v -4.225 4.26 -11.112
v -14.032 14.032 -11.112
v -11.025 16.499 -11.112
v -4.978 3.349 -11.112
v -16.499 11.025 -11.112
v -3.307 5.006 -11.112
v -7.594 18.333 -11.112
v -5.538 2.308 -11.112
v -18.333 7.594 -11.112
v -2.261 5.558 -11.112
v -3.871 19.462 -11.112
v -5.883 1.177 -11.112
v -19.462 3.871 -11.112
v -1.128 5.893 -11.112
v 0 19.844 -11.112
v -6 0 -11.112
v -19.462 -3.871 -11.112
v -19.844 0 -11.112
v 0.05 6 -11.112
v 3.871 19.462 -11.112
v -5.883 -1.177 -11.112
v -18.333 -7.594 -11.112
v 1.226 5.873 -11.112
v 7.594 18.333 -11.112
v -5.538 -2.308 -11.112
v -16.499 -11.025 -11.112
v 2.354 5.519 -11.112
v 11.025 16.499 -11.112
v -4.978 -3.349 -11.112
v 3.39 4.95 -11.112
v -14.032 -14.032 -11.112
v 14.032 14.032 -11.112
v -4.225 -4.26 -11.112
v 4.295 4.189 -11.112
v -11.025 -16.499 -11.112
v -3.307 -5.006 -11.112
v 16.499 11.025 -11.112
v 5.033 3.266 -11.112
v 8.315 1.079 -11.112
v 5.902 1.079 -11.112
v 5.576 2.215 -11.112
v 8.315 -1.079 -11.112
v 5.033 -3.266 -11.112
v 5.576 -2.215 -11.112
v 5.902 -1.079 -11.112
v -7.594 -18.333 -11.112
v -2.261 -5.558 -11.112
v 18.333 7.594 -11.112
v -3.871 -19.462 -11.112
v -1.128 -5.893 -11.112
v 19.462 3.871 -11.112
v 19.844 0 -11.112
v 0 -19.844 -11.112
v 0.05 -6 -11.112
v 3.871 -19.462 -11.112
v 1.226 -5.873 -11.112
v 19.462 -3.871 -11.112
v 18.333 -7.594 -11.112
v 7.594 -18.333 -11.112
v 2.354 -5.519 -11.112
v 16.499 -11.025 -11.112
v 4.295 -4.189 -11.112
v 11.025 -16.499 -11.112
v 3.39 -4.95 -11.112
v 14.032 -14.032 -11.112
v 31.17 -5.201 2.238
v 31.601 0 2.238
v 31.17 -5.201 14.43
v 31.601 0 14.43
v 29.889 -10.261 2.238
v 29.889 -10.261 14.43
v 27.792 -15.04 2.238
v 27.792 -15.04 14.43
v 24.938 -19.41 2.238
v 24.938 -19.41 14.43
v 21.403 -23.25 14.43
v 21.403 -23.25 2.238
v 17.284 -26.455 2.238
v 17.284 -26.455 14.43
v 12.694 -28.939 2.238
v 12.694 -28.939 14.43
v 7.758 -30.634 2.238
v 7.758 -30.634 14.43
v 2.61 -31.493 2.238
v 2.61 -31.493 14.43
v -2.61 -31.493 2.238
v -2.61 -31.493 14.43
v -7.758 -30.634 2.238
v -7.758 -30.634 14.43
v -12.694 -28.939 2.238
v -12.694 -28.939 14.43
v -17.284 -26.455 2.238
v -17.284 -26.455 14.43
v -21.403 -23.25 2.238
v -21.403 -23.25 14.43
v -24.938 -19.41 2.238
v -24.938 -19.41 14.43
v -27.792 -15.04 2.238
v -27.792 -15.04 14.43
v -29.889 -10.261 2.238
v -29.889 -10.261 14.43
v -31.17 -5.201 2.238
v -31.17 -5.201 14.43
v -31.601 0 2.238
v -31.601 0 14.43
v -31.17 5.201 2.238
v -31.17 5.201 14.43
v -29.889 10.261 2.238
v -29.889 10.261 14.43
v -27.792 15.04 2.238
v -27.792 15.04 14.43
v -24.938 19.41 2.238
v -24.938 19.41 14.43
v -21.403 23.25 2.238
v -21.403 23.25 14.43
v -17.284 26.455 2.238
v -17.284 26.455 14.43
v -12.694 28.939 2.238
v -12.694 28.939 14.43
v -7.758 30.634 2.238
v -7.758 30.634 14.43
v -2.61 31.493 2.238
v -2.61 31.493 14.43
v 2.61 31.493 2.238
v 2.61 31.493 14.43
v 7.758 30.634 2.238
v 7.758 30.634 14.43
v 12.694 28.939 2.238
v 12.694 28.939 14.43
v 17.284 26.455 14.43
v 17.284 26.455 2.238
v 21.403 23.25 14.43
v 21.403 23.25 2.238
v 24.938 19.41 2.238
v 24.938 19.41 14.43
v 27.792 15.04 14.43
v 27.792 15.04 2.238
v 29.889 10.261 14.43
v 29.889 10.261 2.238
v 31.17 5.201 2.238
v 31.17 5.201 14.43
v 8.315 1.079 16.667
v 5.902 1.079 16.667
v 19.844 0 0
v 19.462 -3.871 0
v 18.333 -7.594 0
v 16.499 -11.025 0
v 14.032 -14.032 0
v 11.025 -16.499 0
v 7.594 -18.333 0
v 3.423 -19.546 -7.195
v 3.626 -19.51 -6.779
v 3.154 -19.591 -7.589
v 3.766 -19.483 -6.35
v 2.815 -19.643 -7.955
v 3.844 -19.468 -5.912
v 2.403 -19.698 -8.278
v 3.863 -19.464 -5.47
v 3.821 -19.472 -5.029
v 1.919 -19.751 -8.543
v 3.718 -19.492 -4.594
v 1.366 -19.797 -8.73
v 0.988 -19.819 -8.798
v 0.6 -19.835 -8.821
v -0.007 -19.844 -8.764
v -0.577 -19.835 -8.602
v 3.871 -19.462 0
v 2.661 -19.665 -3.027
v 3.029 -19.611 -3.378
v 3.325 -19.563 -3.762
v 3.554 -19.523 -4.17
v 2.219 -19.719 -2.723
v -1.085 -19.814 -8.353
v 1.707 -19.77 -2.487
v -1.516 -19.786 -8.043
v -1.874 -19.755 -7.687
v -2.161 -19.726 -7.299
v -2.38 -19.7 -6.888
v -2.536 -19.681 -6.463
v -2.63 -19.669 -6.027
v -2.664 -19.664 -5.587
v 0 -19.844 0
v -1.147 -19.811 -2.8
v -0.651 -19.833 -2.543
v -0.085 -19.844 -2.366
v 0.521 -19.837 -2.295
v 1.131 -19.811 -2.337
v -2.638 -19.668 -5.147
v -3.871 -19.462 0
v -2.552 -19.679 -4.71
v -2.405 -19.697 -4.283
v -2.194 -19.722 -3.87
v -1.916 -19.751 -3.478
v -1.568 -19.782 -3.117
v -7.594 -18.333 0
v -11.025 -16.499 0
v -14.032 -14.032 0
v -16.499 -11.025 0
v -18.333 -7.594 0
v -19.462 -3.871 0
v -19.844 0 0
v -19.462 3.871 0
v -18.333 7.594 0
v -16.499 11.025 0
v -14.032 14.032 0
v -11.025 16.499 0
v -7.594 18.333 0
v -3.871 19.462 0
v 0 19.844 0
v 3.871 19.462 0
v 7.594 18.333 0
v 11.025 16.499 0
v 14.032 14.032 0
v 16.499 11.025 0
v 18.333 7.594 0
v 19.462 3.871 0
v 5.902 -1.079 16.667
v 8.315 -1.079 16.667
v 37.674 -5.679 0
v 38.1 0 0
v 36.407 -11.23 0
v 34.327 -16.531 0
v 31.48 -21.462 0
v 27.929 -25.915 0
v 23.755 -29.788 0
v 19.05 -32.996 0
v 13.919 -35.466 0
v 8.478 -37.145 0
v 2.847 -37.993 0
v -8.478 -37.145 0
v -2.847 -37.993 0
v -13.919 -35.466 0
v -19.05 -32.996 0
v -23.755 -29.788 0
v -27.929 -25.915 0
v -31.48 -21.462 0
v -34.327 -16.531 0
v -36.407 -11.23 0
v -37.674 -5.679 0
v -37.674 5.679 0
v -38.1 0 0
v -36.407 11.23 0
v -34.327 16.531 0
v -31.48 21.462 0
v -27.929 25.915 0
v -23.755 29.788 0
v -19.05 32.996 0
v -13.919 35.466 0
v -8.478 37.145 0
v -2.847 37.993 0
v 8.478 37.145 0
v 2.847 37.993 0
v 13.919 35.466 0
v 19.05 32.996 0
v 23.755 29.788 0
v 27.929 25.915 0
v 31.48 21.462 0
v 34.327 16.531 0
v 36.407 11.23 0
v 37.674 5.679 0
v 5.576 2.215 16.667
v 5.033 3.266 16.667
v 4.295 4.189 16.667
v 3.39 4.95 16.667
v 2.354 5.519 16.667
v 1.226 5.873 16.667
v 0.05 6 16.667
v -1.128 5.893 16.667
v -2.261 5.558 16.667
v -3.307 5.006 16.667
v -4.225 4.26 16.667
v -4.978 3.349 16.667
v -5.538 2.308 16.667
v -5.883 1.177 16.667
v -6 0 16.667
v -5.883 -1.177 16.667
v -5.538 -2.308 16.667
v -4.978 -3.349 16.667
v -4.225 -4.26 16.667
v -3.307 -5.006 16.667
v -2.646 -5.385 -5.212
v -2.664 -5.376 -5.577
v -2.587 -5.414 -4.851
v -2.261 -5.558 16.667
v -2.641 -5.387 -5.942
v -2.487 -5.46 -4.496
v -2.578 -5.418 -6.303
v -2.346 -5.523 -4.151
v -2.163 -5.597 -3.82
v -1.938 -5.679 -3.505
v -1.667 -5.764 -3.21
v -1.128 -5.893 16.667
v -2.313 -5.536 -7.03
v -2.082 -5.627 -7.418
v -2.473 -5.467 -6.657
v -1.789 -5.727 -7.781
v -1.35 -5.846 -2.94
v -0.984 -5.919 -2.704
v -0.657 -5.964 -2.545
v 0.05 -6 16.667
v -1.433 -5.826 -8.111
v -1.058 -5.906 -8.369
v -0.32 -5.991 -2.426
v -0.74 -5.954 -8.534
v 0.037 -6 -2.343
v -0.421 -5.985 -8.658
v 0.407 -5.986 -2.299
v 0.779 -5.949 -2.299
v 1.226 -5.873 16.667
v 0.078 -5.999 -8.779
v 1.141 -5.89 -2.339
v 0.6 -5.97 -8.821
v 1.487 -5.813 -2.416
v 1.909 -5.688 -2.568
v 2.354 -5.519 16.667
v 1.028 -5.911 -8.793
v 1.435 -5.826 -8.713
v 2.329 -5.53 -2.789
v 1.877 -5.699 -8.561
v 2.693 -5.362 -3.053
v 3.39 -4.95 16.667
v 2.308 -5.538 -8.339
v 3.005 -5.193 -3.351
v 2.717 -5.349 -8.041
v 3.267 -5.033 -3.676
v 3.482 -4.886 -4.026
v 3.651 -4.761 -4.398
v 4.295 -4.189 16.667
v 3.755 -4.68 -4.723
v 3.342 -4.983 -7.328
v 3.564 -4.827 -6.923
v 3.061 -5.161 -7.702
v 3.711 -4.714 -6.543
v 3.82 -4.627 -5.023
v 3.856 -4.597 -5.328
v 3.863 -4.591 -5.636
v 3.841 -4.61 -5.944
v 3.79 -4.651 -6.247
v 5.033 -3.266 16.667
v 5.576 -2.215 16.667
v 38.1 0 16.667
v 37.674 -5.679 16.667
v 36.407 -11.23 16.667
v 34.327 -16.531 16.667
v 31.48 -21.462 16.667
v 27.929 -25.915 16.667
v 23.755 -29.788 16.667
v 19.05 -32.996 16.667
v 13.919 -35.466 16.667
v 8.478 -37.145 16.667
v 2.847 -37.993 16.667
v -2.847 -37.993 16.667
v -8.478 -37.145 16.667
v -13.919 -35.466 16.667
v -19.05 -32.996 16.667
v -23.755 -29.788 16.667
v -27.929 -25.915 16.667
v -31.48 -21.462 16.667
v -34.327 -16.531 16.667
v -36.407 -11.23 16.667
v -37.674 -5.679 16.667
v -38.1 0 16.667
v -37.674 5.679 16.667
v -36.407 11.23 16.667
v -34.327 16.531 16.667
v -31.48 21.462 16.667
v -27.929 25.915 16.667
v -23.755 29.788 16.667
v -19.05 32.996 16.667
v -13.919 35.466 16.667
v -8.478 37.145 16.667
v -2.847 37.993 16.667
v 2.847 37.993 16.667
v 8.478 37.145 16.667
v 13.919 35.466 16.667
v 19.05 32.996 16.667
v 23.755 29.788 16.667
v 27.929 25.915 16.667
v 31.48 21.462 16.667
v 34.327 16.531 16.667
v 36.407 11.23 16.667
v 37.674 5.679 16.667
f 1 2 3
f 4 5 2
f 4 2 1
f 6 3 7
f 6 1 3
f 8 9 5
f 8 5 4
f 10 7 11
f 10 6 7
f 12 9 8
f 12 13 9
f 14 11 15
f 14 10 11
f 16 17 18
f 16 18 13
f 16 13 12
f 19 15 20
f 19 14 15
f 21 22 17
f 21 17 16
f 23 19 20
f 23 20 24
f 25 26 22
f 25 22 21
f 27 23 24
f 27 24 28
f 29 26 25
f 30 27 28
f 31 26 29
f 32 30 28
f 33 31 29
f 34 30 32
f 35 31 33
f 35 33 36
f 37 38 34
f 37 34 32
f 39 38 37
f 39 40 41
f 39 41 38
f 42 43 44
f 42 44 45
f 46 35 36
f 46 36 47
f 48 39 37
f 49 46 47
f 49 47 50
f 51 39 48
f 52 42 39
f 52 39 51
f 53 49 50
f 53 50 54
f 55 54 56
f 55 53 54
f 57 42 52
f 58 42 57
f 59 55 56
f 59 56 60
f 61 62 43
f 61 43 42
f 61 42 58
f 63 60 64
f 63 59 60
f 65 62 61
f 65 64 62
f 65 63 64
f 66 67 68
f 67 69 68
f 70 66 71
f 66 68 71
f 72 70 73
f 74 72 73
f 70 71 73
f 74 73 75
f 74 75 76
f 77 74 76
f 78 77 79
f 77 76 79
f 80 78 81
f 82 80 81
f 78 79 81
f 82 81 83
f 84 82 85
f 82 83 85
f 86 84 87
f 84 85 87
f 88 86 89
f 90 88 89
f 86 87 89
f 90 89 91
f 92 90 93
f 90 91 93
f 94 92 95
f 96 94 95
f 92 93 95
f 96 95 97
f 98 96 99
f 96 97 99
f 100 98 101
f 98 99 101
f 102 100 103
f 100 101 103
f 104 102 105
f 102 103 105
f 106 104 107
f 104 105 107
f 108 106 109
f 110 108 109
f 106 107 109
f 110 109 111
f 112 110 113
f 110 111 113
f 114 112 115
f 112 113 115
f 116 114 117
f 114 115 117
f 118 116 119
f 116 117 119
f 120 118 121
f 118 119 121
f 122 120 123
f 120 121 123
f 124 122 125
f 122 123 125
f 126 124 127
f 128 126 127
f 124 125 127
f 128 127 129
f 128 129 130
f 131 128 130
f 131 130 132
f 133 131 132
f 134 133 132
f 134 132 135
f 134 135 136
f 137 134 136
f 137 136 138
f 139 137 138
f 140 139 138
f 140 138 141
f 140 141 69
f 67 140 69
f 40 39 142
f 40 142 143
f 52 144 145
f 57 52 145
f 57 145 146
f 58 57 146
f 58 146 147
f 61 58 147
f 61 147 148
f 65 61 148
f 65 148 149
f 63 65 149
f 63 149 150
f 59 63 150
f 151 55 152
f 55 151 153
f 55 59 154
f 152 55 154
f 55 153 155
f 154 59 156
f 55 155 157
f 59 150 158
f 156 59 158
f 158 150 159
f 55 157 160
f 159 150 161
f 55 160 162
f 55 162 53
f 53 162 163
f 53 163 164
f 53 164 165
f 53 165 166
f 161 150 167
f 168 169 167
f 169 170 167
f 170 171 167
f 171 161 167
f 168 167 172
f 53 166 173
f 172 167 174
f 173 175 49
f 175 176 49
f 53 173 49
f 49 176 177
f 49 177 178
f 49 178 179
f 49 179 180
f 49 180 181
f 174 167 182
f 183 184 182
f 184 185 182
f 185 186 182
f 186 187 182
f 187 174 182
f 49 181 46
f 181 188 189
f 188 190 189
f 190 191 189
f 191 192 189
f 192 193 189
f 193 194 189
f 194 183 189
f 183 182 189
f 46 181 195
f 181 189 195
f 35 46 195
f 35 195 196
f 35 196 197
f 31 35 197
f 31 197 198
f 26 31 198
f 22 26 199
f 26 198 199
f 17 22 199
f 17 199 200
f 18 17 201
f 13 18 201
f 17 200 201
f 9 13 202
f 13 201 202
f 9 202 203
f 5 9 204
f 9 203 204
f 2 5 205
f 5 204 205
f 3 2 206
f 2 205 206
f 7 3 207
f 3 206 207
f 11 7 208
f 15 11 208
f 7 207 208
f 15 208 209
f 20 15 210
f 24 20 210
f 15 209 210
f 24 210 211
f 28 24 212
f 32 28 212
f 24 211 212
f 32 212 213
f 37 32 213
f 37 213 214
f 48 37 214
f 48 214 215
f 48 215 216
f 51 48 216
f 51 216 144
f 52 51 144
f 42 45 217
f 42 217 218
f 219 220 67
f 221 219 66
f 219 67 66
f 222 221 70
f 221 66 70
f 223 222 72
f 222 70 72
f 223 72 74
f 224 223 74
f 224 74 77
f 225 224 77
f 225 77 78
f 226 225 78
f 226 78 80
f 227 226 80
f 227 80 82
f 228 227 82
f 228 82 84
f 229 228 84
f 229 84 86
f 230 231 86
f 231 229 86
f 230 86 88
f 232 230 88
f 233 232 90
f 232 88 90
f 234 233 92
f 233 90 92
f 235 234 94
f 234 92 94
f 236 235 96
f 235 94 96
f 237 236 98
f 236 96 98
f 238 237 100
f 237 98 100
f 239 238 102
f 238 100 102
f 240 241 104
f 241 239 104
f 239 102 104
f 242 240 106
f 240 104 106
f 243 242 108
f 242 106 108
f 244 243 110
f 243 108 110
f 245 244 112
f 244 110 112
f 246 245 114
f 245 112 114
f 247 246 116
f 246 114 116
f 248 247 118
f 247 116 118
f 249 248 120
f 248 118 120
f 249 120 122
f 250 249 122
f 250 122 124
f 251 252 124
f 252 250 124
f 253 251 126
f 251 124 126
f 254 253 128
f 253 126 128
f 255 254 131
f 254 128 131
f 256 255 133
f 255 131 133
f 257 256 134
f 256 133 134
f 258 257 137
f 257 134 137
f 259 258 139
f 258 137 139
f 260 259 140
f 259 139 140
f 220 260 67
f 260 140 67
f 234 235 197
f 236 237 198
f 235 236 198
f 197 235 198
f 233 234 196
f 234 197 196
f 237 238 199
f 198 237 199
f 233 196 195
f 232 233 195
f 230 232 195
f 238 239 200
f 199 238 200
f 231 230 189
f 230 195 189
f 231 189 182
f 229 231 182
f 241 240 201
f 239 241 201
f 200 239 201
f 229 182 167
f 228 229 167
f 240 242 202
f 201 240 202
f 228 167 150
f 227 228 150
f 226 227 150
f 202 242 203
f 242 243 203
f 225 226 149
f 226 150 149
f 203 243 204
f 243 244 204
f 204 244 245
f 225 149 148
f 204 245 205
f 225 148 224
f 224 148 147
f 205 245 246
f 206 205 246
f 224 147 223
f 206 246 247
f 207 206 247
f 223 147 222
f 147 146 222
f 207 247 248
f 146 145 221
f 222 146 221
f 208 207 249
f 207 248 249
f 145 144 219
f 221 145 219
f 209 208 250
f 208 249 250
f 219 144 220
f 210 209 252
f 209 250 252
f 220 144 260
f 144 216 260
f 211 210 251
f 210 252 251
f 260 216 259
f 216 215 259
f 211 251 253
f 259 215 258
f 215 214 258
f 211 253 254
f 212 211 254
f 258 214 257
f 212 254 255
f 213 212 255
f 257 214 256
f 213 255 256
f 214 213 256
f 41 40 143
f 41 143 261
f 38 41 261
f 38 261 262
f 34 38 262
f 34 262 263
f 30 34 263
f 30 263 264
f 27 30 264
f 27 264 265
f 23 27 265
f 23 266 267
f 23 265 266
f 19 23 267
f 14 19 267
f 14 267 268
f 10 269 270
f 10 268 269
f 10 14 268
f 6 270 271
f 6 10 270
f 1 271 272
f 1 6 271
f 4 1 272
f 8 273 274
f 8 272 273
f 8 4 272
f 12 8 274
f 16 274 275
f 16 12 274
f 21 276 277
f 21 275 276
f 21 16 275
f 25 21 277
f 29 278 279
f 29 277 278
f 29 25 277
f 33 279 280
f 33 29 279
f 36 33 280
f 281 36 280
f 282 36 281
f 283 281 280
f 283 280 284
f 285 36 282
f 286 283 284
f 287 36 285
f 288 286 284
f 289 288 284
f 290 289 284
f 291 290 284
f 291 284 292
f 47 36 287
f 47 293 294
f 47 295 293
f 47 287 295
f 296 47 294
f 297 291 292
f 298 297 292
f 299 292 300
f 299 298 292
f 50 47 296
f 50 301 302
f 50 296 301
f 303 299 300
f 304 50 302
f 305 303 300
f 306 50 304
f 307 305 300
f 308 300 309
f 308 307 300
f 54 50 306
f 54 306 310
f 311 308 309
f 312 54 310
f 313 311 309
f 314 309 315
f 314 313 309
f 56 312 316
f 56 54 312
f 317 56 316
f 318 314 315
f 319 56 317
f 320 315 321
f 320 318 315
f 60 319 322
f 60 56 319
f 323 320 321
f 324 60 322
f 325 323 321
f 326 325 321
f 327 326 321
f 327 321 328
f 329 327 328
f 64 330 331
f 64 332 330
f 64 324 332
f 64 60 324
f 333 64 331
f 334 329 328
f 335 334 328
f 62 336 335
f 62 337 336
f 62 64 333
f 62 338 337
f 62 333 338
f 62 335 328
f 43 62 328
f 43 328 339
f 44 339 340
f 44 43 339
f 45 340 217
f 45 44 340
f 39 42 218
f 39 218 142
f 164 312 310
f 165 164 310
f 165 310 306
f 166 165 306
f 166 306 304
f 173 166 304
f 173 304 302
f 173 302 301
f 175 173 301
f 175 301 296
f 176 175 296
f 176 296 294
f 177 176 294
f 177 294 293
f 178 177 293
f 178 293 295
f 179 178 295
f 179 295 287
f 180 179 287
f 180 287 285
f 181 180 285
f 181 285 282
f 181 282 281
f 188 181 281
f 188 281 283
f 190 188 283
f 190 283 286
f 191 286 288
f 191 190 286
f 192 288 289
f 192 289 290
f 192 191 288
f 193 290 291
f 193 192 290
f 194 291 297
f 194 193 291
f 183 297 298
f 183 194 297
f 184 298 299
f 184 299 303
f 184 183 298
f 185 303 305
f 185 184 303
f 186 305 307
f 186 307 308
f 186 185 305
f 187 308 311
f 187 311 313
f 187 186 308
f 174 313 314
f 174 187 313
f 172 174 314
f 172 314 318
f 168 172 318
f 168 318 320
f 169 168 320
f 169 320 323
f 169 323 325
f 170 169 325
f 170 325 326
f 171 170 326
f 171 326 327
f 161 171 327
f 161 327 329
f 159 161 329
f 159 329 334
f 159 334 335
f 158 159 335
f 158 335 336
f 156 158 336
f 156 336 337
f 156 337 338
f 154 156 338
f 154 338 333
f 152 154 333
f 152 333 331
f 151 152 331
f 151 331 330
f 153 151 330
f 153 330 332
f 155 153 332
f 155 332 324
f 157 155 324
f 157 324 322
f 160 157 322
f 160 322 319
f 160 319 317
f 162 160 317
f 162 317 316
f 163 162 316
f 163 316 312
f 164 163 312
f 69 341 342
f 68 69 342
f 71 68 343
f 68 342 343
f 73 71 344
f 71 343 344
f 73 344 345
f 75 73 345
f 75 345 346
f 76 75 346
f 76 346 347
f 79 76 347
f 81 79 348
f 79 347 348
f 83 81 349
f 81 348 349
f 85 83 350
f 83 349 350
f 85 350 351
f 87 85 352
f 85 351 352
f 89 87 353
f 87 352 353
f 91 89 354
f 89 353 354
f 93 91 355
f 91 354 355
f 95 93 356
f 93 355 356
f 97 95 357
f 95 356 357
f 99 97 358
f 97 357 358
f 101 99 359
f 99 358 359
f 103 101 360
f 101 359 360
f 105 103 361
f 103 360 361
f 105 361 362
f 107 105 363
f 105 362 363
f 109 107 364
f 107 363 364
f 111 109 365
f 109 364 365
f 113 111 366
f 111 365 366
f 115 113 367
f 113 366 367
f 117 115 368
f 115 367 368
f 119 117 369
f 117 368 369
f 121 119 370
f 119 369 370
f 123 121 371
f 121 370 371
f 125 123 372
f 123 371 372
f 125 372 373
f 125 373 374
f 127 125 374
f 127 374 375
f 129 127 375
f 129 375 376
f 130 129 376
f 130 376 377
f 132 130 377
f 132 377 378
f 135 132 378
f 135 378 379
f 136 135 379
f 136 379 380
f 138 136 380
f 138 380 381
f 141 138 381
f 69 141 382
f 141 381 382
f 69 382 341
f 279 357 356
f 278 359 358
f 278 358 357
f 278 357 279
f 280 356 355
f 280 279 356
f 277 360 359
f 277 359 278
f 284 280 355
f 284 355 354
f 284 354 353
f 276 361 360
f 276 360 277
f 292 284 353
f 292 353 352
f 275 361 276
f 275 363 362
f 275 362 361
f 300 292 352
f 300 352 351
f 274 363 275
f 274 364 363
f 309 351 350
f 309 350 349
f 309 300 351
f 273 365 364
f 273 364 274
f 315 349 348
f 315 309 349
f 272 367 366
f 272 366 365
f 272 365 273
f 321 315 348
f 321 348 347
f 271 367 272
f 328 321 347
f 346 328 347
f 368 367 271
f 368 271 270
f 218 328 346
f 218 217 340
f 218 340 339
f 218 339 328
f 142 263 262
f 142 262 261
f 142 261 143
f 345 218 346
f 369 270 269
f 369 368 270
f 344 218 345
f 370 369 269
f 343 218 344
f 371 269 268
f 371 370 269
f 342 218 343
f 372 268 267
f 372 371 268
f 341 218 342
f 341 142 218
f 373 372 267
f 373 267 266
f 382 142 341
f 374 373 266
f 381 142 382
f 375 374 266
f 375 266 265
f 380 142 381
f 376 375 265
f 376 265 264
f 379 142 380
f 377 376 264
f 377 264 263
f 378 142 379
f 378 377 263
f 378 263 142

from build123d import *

# Parameters (mm, degrees)
SKETCH1_R               = 38.1
BOSS_EXTRUDE1_DEPTH     = 16.66748
SKETCH2_R               = 19.84375
BOSS_EXTRUDE2_DEPTH     = 11.1125
CUT_EXTRUDE1_DEPTH      = 61.621343509
CUT_EXTRUDE2_DEPTH      = 11.1125
CUT_EXTRUDE2_DEPTH_BACK = 11.1125
SKETCH5_R               = 3.2639


with BuildPart() as part:
    # Sketch1 → Boss-Extrude1 (new body)
    with BuildSketch(Plane.XY):
        Circle(SKETCH1_R)
    extrude(amount=BOSS_EXTRUDE1_DEPTH)

    # Sketch2 → Boss-Extrude2 (add)
    with BuildSketch(Plane(origin=(0, 0, 0), x_dir=(-1, 0, 0), z_dir=(0, 0, -1))):
        with Locations(Location((0, 0, 0), (0, 0, 180))):
            Circle(SKETCH2_R)
    extrude(amount=BOSS_EXTRUDE2_DEPTH)

    # Sketch3 → Cut-Extrude1 (cut, through all)
    with BuildSketch(Plane(origin=(0, 0, -11.1125), x_dir=(-1, 0, 0), z_dir=(0, 0, -1))):
        with BuildLine():
            Line((-5.902263385, -1.078557803), (-8.315263385, -1.078557803))
            Line((-8.315263385, -1.078557803), (-8.315263385, 1.078557803))
            Line((-8.315263385, 1.078557803), (-5.902263385, 1.078557803))
            ThreePointArc((-5.902263385, 1.078557803), (6, 0), (-5.902263385, -1.078557803))
        make_face()
    extrude(amount=-CUT_EXTRUDE1_DEPTH, mode=Mode.SUBTRACT)

    # Sketch5 → Cut-Extrude2 (cut, two sides: drawn at the far end of the back side and taken through both)
    with BuildSketch(Plane(origin=(0, -9.525, 0), x_dir=(1, 0, 0), z_dir=(0, 1, 0)).offset(-CUT_EXTRUDE2_DEPTH_BACK)):
        with Locations(Location((0.599890424, 5.55752, 0), (0, 0, 90))):
            Circle(SKETCH5_R)
    extrude(amount=CUT_EXTRUDE2_DEPTH + CUT_EXTRUDE2_DEPTH_BACK, mode=Mode.SUBTRACT)

    # Sketch7 → Cut-Revolve1 (revolve, cut)
    with BuildSketch(Plane(origin=(0, 0, 0), x_dir=(0, 0, -1), z_dir=(1, 0, 0)), mode=Mode.PRIVATE) as cut_revolve1_sk:
        Polygon((-16.66748, 38.1), (0, 38.1), (-2.23774, 31.601131151), (-14.42974, 31.601131151), align=None)
    revolve(cut_revolve1_sk.sketch.rotate(Axis((0, 0, 16.66748), (0, 0, -1)), 90), axis=Axis((0, 0, 16.66748), (0, 0, -1)), mode=Mode.SUBTRACT)


solid = part.part
